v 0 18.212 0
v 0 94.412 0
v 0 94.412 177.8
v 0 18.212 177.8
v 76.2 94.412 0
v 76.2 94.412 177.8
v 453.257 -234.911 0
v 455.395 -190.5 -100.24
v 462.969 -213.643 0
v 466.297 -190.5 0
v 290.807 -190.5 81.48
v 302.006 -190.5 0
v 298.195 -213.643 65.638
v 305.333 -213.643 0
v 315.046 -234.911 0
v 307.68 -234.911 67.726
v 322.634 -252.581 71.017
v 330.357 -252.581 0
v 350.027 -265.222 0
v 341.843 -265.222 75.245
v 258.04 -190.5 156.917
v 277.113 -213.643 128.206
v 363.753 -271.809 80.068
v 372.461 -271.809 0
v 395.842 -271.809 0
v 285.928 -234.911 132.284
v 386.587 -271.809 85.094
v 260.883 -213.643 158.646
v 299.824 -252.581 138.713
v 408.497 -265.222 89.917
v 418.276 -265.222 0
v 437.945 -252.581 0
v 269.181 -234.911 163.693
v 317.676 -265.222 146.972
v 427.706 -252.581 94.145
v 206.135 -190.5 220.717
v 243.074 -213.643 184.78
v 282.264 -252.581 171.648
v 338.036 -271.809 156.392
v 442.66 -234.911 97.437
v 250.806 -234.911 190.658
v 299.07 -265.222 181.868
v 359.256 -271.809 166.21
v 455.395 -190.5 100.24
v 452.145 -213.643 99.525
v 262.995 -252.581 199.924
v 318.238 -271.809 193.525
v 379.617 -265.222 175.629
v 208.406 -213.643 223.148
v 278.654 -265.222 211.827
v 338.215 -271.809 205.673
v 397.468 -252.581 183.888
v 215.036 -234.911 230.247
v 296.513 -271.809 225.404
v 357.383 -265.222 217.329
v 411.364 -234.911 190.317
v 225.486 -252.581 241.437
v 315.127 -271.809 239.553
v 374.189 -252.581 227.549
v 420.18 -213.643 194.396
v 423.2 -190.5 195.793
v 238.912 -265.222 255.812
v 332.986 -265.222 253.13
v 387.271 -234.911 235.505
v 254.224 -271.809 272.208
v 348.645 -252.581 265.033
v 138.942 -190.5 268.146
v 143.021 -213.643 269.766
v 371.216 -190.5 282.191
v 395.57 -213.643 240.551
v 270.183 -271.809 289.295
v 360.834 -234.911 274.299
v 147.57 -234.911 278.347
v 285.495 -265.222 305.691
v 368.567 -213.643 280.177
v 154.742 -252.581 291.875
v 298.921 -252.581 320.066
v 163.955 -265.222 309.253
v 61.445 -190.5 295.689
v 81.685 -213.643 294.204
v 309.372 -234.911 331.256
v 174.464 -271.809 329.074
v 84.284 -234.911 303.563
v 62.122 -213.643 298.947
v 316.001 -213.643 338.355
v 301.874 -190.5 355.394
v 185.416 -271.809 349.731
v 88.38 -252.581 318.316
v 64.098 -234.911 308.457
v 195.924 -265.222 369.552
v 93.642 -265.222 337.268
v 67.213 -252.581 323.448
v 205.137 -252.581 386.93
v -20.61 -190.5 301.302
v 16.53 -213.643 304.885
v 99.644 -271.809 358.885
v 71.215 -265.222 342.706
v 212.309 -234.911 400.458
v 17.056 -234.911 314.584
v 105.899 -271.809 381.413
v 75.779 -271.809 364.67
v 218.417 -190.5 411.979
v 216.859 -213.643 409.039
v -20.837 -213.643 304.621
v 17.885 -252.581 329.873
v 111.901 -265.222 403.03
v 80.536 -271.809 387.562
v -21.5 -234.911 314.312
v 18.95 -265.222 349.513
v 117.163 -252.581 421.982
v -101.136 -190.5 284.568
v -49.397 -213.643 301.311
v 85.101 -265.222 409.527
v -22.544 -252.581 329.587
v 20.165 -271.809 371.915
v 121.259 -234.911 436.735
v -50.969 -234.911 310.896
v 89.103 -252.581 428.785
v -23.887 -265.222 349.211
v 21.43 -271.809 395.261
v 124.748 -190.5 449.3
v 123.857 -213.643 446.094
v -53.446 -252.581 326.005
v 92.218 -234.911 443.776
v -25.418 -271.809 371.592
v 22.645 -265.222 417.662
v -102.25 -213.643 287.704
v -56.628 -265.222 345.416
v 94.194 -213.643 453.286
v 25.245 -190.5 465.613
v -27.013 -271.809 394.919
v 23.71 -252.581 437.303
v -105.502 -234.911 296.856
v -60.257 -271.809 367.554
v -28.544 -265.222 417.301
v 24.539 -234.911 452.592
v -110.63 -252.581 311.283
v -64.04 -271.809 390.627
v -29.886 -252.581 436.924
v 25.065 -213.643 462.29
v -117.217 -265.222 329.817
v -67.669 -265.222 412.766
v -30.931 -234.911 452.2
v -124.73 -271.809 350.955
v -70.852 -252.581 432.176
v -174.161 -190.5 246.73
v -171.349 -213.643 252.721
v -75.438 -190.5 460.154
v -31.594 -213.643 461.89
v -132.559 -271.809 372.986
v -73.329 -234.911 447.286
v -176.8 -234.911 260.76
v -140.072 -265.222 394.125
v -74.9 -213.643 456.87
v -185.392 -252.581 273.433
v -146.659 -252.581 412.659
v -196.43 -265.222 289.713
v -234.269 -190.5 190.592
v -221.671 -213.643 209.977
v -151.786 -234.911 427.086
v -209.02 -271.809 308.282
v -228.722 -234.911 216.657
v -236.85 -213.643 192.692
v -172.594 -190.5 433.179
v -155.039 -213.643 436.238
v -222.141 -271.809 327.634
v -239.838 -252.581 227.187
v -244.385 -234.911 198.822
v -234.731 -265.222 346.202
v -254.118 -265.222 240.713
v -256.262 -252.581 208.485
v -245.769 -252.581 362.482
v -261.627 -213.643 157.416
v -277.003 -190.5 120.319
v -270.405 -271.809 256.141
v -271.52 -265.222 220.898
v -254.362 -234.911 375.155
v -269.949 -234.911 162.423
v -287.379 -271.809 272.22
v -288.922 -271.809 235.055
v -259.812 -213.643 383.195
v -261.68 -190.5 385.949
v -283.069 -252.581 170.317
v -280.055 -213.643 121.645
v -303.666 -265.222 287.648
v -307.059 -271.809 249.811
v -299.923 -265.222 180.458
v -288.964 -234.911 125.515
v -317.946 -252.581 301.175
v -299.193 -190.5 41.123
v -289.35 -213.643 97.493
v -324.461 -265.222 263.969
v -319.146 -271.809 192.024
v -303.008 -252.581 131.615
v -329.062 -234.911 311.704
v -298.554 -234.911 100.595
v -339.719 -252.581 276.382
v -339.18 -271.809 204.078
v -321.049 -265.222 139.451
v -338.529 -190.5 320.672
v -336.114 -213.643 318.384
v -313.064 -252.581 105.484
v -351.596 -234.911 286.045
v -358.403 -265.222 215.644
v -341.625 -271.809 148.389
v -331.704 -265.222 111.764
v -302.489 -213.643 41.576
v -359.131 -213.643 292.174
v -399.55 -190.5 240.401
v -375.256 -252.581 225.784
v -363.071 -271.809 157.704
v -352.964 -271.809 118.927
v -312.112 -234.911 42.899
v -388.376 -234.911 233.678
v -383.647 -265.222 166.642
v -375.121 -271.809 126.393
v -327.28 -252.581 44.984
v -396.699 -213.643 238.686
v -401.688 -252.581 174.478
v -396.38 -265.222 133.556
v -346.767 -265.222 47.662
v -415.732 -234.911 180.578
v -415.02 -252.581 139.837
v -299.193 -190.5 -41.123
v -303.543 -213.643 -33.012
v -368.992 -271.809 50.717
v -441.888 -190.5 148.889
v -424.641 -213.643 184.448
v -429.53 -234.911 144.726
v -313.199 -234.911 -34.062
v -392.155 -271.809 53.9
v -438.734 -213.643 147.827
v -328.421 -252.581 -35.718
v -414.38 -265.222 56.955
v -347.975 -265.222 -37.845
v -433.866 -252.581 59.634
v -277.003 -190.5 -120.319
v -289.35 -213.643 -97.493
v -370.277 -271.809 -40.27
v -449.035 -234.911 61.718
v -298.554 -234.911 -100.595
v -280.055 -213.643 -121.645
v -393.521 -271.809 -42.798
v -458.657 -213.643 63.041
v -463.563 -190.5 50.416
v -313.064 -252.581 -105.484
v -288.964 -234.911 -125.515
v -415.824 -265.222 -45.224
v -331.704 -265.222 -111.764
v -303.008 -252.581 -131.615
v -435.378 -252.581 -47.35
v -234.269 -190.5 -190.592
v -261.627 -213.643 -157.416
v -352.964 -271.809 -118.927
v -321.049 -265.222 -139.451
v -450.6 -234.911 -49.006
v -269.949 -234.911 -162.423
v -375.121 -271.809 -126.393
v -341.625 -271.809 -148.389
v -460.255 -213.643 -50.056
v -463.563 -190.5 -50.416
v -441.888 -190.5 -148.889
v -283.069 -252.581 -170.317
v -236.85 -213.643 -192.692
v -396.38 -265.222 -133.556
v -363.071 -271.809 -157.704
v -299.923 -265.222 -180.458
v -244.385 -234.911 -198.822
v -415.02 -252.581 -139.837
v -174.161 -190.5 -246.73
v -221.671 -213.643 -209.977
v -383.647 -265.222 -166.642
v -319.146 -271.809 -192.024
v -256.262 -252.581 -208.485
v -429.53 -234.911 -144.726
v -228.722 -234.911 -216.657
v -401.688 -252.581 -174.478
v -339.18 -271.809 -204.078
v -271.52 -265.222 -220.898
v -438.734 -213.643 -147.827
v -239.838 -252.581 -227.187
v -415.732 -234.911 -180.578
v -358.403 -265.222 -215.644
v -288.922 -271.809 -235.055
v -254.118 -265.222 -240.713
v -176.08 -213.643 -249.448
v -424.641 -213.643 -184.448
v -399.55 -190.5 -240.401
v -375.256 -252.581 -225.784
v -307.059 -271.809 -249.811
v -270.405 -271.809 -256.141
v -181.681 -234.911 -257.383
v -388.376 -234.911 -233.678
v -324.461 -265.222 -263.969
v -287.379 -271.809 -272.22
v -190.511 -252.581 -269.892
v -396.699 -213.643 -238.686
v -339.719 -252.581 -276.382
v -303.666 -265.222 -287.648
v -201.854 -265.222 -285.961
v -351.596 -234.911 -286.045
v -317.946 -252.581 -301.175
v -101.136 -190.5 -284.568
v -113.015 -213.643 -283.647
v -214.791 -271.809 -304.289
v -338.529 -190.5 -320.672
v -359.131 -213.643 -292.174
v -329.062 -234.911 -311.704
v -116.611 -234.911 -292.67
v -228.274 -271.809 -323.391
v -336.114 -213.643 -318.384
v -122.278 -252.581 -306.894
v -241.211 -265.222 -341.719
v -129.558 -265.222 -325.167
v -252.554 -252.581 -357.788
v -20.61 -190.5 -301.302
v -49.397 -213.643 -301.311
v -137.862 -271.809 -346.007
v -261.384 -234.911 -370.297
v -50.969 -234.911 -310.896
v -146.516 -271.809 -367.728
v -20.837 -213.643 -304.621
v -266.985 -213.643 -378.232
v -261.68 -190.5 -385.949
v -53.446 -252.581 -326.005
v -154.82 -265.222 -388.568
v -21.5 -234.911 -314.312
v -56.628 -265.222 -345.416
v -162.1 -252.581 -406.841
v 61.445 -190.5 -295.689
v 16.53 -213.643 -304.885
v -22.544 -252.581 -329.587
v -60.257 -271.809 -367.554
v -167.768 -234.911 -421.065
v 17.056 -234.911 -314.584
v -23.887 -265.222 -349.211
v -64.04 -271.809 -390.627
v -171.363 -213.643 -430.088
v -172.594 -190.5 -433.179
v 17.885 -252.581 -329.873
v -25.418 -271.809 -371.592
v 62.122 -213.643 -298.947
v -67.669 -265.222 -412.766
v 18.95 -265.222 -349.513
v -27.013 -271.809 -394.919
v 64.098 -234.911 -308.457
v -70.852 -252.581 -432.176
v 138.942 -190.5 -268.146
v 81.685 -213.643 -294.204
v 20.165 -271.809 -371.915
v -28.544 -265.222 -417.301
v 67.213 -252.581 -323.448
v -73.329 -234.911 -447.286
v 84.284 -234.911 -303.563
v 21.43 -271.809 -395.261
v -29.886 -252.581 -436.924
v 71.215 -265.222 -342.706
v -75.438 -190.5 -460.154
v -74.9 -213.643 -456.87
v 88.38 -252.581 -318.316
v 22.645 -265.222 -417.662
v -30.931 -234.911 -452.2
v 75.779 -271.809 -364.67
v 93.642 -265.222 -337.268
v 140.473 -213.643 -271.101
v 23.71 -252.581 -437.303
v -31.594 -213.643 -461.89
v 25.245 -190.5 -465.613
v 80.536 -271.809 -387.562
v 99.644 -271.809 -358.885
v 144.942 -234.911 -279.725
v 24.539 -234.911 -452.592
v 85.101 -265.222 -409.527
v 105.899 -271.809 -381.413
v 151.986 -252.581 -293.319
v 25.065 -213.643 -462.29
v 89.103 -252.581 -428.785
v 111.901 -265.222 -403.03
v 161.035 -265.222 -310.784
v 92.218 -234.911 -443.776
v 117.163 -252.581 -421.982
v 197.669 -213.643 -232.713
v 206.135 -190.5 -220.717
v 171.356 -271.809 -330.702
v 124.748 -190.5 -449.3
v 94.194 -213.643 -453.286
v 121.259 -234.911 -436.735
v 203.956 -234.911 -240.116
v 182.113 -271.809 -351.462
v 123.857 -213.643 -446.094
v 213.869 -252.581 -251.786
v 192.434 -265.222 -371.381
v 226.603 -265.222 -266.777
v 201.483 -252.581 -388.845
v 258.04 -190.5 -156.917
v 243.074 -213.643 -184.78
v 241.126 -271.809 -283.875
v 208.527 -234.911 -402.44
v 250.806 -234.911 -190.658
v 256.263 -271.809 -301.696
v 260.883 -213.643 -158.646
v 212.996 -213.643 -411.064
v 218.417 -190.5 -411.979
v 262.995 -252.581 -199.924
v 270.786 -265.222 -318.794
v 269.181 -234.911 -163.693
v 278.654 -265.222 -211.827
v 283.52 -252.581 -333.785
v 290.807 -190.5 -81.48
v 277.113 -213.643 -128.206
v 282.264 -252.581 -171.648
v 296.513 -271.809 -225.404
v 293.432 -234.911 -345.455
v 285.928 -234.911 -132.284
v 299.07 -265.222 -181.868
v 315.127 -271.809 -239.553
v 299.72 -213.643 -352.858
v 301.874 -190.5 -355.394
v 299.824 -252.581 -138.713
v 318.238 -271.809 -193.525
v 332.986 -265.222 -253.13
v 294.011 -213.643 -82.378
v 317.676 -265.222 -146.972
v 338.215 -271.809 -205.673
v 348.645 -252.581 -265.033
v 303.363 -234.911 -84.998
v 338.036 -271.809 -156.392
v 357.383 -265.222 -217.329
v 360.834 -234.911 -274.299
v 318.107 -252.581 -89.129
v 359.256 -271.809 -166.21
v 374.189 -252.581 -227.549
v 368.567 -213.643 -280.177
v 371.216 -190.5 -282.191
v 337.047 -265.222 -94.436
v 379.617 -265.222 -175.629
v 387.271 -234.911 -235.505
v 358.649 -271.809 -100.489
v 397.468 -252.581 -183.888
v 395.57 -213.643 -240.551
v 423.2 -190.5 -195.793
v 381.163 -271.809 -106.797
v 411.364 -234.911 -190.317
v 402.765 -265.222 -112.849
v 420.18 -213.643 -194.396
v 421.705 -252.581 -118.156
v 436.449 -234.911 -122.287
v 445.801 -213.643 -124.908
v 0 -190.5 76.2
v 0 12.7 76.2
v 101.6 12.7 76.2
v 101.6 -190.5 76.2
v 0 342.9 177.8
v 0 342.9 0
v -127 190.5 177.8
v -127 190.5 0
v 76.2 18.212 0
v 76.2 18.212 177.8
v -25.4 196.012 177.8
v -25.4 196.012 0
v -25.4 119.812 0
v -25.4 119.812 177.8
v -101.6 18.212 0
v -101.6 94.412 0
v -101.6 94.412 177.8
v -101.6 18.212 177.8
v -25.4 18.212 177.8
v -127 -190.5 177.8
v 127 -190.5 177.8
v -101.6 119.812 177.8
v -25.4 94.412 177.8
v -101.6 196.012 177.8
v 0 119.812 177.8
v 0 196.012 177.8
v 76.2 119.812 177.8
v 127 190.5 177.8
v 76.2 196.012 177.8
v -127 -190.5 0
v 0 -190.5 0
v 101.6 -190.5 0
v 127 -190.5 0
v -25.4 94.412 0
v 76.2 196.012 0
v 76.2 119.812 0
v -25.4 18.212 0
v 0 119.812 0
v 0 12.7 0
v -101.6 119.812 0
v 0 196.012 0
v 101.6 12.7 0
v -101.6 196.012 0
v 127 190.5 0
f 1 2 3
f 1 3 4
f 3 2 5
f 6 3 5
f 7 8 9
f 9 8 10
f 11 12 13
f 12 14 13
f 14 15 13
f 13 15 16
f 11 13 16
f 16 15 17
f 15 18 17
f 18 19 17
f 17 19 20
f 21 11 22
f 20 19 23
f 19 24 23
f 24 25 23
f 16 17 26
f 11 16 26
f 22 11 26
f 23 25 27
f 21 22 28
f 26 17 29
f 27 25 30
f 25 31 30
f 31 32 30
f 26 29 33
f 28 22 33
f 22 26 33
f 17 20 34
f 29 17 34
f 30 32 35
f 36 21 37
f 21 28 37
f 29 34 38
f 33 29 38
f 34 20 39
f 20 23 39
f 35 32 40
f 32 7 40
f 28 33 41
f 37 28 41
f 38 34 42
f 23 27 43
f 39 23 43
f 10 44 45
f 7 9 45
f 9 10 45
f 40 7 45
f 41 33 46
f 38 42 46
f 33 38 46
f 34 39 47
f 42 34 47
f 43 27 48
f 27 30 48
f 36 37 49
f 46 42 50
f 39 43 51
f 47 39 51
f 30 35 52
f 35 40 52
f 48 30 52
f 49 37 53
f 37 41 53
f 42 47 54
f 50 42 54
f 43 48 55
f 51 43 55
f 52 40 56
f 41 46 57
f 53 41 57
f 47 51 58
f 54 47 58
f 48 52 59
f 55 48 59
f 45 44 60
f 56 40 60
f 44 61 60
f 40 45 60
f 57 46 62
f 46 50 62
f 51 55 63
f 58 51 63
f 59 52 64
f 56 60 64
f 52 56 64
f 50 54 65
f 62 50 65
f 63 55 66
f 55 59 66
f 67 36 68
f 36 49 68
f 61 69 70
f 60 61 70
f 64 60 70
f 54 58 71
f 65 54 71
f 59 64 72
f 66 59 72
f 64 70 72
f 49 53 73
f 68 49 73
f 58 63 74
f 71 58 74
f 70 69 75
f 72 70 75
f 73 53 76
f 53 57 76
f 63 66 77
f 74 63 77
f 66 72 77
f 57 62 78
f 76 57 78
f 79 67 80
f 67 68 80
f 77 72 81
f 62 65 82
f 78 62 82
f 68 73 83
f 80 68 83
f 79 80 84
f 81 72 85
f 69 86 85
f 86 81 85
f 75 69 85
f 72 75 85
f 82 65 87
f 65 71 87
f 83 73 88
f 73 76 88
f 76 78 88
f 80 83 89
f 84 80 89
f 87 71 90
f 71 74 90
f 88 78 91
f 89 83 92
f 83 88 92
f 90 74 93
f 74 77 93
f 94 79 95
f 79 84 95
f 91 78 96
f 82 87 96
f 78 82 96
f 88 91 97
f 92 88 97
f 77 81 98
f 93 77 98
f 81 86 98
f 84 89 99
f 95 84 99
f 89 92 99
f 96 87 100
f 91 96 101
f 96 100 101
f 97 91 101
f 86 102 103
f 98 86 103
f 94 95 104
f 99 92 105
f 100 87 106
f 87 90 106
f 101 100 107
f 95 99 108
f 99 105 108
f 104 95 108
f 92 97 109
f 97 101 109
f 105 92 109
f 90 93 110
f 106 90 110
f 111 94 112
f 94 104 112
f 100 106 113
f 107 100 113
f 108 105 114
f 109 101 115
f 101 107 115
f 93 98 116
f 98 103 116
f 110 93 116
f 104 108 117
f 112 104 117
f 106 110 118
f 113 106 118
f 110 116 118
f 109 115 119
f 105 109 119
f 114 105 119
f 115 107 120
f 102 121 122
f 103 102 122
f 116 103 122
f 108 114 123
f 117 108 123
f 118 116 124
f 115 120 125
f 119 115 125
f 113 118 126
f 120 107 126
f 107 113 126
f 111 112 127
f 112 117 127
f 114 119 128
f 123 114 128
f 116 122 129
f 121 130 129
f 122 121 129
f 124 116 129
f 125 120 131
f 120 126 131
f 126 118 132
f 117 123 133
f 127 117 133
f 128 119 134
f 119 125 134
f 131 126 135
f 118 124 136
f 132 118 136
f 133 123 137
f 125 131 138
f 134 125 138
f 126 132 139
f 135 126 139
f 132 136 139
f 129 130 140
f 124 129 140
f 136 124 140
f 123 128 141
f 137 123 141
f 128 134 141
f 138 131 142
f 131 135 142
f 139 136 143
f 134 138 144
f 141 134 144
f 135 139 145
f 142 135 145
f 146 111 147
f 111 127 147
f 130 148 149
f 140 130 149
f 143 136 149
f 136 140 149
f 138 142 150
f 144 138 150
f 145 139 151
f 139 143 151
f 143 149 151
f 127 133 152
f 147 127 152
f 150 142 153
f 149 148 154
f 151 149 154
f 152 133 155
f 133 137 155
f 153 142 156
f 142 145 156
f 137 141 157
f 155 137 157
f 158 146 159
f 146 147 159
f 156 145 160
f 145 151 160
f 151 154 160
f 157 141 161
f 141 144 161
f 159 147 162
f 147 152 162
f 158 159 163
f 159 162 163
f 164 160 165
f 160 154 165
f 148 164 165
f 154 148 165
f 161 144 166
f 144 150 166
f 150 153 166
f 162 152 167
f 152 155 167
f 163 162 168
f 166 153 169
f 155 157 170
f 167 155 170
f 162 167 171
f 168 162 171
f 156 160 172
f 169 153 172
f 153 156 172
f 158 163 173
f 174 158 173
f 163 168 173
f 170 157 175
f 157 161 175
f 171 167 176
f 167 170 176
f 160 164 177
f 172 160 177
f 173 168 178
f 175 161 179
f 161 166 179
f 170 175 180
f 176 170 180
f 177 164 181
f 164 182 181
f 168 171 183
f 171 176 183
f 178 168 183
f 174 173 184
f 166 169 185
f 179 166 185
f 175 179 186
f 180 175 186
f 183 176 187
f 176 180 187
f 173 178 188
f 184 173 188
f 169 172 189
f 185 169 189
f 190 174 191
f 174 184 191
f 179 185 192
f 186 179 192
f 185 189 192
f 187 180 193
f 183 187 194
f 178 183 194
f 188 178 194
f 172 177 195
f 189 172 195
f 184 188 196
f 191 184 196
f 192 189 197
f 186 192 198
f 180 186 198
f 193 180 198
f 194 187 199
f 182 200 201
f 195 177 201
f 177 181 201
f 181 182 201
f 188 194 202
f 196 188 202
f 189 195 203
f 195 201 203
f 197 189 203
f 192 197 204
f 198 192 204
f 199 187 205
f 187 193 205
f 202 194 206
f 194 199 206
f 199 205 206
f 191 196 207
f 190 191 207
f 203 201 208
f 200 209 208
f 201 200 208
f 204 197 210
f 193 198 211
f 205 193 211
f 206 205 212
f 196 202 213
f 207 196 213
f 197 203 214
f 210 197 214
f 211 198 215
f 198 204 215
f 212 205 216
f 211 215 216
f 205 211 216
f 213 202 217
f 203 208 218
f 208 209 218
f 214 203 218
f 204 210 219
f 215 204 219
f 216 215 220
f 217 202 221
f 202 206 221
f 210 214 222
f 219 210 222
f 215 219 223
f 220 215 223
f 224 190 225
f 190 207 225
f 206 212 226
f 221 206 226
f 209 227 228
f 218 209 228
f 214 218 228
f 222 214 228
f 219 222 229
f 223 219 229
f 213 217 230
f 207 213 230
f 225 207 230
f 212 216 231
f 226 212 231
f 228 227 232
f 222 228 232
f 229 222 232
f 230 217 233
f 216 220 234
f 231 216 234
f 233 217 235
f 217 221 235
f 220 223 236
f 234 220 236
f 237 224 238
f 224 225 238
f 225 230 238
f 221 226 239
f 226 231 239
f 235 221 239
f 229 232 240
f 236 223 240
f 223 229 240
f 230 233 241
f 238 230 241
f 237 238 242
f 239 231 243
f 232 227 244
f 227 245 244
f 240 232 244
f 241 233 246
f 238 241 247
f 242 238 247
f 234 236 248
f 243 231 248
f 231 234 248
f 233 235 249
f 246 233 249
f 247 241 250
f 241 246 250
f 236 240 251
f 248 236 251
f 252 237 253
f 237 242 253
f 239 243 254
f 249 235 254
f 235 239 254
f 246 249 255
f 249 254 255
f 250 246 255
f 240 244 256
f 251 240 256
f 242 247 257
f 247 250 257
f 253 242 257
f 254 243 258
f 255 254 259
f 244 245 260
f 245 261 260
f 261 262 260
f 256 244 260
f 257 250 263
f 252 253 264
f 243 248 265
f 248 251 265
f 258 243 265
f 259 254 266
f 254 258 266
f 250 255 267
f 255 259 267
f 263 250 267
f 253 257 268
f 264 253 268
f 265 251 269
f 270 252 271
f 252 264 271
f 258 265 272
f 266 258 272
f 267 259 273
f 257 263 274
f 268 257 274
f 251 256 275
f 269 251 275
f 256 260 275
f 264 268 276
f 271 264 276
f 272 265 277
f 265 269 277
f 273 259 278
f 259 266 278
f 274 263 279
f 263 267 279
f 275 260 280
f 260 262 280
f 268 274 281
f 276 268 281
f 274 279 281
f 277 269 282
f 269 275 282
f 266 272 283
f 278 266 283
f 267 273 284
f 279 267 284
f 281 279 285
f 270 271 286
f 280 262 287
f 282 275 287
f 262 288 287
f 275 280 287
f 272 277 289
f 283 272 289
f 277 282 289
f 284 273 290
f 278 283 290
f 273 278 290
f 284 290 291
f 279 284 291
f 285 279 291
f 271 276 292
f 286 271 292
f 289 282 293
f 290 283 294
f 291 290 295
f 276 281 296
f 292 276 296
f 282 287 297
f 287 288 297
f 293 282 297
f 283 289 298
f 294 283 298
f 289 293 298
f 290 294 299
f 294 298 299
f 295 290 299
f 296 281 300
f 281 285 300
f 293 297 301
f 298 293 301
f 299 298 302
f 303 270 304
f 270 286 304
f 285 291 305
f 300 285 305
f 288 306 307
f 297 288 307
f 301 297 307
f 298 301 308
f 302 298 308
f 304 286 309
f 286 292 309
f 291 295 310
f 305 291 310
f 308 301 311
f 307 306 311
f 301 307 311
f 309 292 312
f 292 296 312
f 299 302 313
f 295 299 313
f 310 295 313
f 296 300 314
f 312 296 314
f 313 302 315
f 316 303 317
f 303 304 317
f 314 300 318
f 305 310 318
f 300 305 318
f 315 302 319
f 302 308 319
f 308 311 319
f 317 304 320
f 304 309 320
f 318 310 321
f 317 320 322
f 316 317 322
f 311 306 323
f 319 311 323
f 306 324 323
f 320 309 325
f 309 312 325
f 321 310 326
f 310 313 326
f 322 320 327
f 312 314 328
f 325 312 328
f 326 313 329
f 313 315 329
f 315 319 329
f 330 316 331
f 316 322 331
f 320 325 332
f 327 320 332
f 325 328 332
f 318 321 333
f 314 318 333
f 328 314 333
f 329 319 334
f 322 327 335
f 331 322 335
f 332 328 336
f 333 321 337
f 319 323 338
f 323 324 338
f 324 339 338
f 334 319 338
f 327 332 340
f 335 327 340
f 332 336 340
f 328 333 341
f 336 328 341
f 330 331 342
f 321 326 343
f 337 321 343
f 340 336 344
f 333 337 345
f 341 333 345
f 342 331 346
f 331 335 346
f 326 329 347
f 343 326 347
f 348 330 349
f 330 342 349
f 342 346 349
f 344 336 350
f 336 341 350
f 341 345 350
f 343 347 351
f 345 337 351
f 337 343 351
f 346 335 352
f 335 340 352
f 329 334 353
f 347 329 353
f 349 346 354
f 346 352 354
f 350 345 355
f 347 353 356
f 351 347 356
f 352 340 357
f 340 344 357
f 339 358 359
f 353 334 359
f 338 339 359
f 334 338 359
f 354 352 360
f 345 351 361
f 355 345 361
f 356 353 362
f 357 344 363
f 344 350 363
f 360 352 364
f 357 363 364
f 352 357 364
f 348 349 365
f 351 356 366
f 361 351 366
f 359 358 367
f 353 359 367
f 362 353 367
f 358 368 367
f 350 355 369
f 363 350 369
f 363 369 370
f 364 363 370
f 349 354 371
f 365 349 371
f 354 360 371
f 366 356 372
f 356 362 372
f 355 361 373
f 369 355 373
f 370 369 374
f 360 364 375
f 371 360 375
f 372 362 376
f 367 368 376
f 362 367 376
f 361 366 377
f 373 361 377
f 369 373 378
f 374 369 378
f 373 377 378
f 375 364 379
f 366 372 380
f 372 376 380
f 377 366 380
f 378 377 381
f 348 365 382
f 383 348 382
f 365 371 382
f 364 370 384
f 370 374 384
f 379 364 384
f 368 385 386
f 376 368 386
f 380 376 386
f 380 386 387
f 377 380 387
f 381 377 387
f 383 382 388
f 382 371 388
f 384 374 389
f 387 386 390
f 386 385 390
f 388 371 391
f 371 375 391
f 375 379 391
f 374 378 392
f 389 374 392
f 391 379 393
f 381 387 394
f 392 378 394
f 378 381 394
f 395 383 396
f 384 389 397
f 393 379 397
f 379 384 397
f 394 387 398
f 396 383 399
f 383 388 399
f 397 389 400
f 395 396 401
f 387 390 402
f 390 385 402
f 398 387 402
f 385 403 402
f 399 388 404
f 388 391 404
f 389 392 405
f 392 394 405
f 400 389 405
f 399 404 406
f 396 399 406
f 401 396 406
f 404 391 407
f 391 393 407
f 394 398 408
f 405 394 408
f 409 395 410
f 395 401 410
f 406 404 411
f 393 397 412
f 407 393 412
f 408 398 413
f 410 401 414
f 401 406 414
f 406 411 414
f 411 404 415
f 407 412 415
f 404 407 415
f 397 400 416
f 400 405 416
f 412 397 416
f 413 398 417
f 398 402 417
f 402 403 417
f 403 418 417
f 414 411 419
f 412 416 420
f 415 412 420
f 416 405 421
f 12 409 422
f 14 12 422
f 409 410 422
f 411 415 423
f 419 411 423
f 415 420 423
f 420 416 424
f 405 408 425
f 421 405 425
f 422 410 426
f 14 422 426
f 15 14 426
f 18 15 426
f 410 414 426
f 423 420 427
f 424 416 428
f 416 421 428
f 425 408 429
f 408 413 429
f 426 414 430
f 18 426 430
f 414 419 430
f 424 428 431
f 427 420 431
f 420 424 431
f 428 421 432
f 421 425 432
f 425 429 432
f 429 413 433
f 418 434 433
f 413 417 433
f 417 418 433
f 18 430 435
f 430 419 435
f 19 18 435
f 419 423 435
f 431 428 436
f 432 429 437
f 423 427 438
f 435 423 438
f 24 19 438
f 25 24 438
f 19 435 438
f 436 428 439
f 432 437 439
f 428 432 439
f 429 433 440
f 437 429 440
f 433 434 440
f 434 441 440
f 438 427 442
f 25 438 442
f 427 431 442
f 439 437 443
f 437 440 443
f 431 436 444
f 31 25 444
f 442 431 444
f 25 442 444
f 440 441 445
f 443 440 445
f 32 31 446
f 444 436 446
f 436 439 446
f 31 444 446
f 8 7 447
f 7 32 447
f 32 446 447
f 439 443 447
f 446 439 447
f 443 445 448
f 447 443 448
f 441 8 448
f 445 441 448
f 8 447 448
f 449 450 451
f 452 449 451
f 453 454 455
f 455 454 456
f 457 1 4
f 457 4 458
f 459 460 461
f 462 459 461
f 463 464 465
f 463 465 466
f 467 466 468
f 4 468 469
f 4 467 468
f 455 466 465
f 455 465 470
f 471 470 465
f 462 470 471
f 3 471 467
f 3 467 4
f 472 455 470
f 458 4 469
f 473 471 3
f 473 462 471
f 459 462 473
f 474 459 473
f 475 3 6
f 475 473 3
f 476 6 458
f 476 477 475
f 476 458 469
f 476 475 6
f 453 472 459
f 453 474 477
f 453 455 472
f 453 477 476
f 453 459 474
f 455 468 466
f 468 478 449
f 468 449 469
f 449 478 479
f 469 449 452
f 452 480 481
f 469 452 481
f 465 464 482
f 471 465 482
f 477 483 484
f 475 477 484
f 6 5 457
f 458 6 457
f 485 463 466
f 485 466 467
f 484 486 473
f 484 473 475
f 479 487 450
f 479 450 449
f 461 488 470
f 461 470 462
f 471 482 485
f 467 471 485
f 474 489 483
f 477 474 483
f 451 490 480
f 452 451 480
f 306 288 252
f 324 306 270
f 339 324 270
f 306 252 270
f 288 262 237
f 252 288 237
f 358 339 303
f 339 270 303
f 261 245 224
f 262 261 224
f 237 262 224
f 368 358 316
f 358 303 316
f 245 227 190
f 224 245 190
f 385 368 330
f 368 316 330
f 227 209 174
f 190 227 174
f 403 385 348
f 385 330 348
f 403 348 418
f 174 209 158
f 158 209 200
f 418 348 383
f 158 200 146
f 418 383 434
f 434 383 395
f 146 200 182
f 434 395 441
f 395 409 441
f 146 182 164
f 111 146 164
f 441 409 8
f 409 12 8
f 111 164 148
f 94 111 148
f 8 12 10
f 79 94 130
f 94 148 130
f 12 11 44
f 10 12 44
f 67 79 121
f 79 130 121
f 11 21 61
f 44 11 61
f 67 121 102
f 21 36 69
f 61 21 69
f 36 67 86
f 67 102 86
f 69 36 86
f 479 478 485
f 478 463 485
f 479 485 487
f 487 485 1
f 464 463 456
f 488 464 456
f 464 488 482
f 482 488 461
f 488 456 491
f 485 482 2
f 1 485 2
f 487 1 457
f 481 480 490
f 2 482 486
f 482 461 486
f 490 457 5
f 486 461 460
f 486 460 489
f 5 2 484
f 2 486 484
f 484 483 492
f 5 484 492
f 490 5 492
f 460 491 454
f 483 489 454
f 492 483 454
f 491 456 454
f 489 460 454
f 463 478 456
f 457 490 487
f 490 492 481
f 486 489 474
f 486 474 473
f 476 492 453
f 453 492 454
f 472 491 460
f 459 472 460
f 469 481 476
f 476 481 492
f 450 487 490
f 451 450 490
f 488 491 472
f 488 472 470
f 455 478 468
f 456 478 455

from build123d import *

# Parameters (mm, degrees)
F0_W     = 254
F0_H     = 381
F1_DEPTH = 177.8
F2_W     = 101.6
F2_H     = 203.2
F3_DEPTH = 76.2
F6_W     = 76.2
F6_H     = 76.2
F7_DEPTH = 177.8


with BuildPart() as f1:
    # F0 (on Top) → F1 (new body)
    with BuildSketch(Plane.XY):
        Polygon((0, 342.9), (-127, 190.5), (127, 190.5), align=None)
        Rectangle(F0_W, F0_H)
    extrude(amount=F1_DEPTH)

    # F2 (on face) → F3 (cut)
    with BuildSketch(Plane(origin=(0, 0, 0), x_dir=(1, 0, 0), z_dir=(0, 0, -1))):
        with Locations((50.8, 88.9)):
            Rectangle(F2_W, F2_H)
    extrude(amount=-F3_DEPTH, mode=Mode.SUBTRACT)

    # F6 (on face) → F7 (cut, through all)
    with BuildSketch(Plane(origin=(0, 0, 0), x_dir=(1, 0, 0), z_dir=(0, 0, -1))):
        with Locations((38.1, -157.91223)):
            Rectangle(F6_W, F6_H)
        with Locations((38.1, -56.31223)):
            Rectangle(F6_W, F6_H)
        with Locations((-63.5, -56.31223)):
            Rectangle(F6_W, F6_H)
        with Locations((-63.5, -157.91223)):
            Rectangle(F6_W, F6_H)
    extrude(amount=-F7_DEPTH, mode=Mode.SUBTRACT)


with BuildPart() as f5:
    # F4 (on Top) → F5 (revolve)
    with BuildSketch(Plane.XY):
        with BuildLine():
            Line((466.296852, -190.5), (302.005708, -190.5))
            ThreePointArc((302.005708, -190.5), (384.15128, -272.645572), (466.296852, -190.5))
        make_face()
    revolve(axis=Axis((0, -13.008375, 0), (0, -1, 0)))


solid = Compound([f1.part, f5.part])
